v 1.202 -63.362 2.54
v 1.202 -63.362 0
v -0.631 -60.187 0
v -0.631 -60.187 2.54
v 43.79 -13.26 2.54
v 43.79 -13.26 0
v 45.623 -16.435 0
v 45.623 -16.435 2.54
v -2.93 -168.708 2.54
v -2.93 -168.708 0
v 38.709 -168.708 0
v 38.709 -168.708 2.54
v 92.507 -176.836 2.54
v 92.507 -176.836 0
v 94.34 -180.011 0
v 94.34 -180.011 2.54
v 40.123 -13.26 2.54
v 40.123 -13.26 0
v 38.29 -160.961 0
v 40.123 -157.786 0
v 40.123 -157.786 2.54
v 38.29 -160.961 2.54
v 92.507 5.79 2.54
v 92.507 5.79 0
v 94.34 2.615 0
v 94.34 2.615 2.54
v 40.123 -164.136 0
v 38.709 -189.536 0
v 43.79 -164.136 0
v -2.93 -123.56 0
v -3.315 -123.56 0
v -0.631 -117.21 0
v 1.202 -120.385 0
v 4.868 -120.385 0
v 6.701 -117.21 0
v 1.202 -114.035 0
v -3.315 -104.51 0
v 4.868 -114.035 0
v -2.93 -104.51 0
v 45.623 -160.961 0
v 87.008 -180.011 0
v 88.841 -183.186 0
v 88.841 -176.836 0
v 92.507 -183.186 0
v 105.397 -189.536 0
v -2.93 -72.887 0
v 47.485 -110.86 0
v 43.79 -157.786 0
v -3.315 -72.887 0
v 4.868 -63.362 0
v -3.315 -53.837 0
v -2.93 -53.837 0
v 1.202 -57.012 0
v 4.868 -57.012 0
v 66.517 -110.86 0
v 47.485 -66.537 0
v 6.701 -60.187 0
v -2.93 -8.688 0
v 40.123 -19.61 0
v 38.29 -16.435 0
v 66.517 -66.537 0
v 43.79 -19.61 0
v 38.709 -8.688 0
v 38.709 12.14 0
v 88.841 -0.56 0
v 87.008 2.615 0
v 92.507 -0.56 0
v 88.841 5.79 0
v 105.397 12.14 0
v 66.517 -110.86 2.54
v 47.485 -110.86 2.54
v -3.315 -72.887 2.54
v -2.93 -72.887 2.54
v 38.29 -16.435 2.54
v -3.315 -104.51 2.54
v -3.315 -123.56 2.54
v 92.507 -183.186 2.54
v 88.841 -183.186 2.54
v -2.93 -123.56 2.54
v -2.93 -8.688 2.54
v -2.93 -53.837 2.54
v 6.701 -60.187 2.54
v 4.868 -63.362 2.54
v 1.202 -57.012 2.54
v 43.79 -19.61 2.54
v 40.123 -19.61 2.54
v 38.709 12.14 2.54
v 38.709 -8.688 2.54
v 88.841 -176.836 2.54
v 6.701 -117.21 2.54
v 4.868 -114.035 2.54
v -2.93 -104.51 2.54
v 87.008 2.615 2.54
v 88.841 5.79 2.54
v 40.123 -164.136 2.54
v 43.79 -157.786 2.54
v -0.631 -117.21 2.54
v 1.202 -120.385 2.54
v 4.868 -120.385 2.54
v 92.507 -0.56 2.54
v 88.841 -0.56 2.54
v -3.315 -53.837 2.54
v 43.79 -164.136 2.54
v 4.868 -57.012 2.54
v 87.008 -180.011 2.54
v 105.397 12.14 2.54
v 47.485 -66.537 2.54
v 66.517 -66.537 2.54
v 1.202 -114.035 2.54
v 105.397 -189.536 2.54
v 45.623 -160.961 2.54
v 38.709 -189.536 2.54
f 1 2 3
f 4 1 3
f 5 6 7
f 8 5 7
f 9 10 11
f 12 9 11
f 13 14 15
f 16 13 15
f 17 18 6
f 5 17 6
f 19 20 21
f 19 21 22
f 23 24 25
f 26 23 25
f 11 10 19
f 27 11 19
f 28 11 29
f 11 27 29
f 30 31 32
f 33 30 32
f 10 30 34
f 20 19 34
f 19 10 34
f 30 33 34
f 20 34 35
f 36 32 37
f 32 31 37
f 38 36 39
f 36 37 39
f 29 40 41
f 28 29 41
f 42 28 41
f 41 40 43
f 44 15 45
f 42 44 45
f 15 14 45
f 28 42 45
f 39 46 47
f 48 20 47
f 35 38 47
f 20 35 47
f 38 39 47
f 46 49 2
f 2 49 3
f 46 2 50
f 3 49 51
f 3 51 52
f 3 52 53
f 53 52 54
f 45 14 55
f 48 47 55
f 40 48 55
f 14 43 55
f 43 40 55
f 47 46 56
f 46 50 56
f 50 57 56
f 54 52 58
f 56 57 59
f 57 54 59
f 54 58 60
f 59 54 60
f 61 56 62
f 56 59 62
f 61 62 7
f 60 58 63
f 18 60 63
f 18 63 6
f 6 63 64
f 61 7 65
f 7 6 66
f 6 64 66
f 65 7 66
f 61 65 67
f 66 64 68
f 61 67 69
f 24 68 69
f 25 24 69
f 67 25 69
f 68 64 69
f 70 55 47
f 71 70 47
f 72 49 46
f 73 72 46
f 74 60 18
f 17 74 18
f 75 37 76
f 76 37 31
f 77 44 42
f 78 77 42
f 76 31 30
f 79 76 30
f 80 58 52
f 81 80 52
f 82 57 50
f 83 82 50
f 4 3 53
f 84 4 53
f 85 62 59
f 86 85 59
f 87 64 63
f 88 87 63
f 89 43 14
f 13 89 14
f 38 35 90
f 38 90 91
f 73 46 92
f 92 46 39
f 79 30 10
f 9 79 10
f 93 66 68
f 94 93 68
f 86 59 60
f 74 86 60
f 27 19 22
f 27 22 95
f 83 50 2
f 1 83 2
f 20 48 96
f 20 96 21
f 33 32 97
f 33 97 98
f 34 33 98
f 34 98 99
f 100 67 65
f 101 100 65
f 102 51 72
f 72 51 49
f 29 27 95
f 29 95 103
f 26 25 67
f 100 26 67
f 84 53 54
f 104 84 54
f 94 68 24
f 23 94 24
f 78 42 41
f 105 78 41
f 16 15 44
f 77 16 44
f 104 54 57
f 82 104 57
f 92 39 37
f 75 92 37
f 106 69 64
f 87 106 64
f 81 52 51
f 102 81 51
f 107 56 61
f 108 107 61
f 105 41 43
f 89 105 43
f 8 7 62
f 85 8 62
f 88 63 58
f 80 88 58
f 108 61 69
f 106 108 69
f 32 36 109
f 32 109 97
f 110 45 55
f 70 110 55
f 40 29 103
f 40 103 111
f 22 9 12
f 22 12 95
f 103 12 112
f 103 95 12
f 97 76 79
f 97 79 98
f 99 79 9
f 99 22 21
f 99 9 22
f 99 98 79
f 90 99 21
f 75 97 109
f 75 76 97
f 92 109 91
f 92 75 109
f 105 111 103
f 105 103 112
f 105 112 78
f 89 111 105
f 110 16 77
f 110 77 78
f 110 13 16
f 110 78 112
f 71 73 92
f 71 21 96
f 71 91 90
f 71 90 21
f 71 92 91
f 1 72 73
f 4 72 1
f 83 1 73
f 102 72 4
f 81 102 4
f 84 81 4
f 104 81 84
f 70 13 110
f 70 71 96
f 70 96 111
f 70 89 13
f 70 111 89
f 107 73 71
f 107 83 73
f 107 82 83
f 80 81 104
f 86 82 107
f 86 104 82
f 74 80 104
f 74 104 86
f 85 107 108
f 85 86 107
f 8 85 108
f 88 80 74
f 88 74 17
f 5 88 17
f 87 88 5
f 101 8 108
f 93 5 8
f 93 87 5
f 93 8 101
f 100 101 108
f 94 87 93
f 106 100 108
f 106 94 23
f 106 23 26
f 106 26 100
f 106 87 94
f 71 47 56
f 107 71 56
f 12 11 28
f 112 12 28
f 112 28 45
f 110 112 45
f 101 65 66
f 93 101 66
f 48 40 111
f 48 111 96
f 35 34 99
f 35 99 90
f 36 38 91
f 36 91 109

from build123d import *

# Parameters (mm, degrees)
BOSS_EXTRUDE1_DEPTH = 2.54


with BuildPart() as part:
    # Sketch1 → Boss-Extrude1 (new body)
    with BuildSketch(Plane.XY):
        Polygon((-2.930050059, -104.509781075), (-3.314938219, -104.509781075), (-3.314938219, -110.859781075), (-3.314938219, -123.559781075), (-2.930050059, -123.559781075), (-2.930050059, -168.708281075), (38.709428475, -168.708281075), (38.709428475, -189.536281075), (105.397061781, -189.536281075), (66.517436481, -110.859781075), (47.485061781, -110.859781075), (47.485061781, -104.509781075), (47.485061781, -72.886781075), (47.485061781, -66.536781075), (66.517436481, -66.536781075), (105.397061781, 12.139718925), (38.709428475, 12.139718925), (38.709428475, -8.688281075), (-2.930050059, -8.688281075), (-2.930050059, -53.836781075), (-3.314938219, -53.836781075), (-3.314938219, -66.536781075), (-3.314938219, -72.886781075), (-2.930050059, -72.886781075), align=None)
        Polygon((4.868148885, -57.011781075), (6.70123599, -60.186781075), (4.868148885, -63.361781075), (1.201974676, -63.361781075), (-0.631112429, -60.186781075), (1.201974676, -57.011781075), align=None, mode=Mode.SUBTRACT)
        Polygon((45.622728689, -160.961281075), (43.789641585, -157.786281075), (40.123467375, -157.786281075), (38.290380271, -160.961281075), (40.123467375, -164.136281075), (43.789641585, -164.136281075), align=None, mode=Mode.SUBTRACT)
        Polygon((92.506998247, -183.186281075), (88.840824038, -183.186281075), (87.007736933, -180.011281075), (88.840824038, -176.836281075), (92.506998247, -176.836281075), (94.340085352, -180.011281075), align=None, mode=Mode.SUBTRACT)
        Polygon((88.840824038, -0.560281075), (87.007736933, 2.614718925), (88.840824038, 5.789718925), (92.506998247, 5.789718925), (94.340085352, 2.614718925), (92.506998247, -0.560281075), align=None, mode=Mode.SUBTRACT)
        Polygon((43.789641585, -13.260281075), (45.622728689, -16.435281075), (43.789641585, -19.610281075), (40.123467375, -19.610281075), (38.290380271, -16.435281075), (40.123467375, -13.260281075), align=None, mode=Mode.SUBTRACT)
        Polygon((1.201974676, -120.384781075), (4.868148885, -120.384781075), (6.70123599, -117.209781075), (4.868148885, -114.034781075), (1.201974676, -114.034781075), (-0.631112429, -117.209781075), align=None, mode=Mode.SUBTRACT)
    extrude(amount=BOSS_EXTRUDE1_DEPTH)


solid = part.part
